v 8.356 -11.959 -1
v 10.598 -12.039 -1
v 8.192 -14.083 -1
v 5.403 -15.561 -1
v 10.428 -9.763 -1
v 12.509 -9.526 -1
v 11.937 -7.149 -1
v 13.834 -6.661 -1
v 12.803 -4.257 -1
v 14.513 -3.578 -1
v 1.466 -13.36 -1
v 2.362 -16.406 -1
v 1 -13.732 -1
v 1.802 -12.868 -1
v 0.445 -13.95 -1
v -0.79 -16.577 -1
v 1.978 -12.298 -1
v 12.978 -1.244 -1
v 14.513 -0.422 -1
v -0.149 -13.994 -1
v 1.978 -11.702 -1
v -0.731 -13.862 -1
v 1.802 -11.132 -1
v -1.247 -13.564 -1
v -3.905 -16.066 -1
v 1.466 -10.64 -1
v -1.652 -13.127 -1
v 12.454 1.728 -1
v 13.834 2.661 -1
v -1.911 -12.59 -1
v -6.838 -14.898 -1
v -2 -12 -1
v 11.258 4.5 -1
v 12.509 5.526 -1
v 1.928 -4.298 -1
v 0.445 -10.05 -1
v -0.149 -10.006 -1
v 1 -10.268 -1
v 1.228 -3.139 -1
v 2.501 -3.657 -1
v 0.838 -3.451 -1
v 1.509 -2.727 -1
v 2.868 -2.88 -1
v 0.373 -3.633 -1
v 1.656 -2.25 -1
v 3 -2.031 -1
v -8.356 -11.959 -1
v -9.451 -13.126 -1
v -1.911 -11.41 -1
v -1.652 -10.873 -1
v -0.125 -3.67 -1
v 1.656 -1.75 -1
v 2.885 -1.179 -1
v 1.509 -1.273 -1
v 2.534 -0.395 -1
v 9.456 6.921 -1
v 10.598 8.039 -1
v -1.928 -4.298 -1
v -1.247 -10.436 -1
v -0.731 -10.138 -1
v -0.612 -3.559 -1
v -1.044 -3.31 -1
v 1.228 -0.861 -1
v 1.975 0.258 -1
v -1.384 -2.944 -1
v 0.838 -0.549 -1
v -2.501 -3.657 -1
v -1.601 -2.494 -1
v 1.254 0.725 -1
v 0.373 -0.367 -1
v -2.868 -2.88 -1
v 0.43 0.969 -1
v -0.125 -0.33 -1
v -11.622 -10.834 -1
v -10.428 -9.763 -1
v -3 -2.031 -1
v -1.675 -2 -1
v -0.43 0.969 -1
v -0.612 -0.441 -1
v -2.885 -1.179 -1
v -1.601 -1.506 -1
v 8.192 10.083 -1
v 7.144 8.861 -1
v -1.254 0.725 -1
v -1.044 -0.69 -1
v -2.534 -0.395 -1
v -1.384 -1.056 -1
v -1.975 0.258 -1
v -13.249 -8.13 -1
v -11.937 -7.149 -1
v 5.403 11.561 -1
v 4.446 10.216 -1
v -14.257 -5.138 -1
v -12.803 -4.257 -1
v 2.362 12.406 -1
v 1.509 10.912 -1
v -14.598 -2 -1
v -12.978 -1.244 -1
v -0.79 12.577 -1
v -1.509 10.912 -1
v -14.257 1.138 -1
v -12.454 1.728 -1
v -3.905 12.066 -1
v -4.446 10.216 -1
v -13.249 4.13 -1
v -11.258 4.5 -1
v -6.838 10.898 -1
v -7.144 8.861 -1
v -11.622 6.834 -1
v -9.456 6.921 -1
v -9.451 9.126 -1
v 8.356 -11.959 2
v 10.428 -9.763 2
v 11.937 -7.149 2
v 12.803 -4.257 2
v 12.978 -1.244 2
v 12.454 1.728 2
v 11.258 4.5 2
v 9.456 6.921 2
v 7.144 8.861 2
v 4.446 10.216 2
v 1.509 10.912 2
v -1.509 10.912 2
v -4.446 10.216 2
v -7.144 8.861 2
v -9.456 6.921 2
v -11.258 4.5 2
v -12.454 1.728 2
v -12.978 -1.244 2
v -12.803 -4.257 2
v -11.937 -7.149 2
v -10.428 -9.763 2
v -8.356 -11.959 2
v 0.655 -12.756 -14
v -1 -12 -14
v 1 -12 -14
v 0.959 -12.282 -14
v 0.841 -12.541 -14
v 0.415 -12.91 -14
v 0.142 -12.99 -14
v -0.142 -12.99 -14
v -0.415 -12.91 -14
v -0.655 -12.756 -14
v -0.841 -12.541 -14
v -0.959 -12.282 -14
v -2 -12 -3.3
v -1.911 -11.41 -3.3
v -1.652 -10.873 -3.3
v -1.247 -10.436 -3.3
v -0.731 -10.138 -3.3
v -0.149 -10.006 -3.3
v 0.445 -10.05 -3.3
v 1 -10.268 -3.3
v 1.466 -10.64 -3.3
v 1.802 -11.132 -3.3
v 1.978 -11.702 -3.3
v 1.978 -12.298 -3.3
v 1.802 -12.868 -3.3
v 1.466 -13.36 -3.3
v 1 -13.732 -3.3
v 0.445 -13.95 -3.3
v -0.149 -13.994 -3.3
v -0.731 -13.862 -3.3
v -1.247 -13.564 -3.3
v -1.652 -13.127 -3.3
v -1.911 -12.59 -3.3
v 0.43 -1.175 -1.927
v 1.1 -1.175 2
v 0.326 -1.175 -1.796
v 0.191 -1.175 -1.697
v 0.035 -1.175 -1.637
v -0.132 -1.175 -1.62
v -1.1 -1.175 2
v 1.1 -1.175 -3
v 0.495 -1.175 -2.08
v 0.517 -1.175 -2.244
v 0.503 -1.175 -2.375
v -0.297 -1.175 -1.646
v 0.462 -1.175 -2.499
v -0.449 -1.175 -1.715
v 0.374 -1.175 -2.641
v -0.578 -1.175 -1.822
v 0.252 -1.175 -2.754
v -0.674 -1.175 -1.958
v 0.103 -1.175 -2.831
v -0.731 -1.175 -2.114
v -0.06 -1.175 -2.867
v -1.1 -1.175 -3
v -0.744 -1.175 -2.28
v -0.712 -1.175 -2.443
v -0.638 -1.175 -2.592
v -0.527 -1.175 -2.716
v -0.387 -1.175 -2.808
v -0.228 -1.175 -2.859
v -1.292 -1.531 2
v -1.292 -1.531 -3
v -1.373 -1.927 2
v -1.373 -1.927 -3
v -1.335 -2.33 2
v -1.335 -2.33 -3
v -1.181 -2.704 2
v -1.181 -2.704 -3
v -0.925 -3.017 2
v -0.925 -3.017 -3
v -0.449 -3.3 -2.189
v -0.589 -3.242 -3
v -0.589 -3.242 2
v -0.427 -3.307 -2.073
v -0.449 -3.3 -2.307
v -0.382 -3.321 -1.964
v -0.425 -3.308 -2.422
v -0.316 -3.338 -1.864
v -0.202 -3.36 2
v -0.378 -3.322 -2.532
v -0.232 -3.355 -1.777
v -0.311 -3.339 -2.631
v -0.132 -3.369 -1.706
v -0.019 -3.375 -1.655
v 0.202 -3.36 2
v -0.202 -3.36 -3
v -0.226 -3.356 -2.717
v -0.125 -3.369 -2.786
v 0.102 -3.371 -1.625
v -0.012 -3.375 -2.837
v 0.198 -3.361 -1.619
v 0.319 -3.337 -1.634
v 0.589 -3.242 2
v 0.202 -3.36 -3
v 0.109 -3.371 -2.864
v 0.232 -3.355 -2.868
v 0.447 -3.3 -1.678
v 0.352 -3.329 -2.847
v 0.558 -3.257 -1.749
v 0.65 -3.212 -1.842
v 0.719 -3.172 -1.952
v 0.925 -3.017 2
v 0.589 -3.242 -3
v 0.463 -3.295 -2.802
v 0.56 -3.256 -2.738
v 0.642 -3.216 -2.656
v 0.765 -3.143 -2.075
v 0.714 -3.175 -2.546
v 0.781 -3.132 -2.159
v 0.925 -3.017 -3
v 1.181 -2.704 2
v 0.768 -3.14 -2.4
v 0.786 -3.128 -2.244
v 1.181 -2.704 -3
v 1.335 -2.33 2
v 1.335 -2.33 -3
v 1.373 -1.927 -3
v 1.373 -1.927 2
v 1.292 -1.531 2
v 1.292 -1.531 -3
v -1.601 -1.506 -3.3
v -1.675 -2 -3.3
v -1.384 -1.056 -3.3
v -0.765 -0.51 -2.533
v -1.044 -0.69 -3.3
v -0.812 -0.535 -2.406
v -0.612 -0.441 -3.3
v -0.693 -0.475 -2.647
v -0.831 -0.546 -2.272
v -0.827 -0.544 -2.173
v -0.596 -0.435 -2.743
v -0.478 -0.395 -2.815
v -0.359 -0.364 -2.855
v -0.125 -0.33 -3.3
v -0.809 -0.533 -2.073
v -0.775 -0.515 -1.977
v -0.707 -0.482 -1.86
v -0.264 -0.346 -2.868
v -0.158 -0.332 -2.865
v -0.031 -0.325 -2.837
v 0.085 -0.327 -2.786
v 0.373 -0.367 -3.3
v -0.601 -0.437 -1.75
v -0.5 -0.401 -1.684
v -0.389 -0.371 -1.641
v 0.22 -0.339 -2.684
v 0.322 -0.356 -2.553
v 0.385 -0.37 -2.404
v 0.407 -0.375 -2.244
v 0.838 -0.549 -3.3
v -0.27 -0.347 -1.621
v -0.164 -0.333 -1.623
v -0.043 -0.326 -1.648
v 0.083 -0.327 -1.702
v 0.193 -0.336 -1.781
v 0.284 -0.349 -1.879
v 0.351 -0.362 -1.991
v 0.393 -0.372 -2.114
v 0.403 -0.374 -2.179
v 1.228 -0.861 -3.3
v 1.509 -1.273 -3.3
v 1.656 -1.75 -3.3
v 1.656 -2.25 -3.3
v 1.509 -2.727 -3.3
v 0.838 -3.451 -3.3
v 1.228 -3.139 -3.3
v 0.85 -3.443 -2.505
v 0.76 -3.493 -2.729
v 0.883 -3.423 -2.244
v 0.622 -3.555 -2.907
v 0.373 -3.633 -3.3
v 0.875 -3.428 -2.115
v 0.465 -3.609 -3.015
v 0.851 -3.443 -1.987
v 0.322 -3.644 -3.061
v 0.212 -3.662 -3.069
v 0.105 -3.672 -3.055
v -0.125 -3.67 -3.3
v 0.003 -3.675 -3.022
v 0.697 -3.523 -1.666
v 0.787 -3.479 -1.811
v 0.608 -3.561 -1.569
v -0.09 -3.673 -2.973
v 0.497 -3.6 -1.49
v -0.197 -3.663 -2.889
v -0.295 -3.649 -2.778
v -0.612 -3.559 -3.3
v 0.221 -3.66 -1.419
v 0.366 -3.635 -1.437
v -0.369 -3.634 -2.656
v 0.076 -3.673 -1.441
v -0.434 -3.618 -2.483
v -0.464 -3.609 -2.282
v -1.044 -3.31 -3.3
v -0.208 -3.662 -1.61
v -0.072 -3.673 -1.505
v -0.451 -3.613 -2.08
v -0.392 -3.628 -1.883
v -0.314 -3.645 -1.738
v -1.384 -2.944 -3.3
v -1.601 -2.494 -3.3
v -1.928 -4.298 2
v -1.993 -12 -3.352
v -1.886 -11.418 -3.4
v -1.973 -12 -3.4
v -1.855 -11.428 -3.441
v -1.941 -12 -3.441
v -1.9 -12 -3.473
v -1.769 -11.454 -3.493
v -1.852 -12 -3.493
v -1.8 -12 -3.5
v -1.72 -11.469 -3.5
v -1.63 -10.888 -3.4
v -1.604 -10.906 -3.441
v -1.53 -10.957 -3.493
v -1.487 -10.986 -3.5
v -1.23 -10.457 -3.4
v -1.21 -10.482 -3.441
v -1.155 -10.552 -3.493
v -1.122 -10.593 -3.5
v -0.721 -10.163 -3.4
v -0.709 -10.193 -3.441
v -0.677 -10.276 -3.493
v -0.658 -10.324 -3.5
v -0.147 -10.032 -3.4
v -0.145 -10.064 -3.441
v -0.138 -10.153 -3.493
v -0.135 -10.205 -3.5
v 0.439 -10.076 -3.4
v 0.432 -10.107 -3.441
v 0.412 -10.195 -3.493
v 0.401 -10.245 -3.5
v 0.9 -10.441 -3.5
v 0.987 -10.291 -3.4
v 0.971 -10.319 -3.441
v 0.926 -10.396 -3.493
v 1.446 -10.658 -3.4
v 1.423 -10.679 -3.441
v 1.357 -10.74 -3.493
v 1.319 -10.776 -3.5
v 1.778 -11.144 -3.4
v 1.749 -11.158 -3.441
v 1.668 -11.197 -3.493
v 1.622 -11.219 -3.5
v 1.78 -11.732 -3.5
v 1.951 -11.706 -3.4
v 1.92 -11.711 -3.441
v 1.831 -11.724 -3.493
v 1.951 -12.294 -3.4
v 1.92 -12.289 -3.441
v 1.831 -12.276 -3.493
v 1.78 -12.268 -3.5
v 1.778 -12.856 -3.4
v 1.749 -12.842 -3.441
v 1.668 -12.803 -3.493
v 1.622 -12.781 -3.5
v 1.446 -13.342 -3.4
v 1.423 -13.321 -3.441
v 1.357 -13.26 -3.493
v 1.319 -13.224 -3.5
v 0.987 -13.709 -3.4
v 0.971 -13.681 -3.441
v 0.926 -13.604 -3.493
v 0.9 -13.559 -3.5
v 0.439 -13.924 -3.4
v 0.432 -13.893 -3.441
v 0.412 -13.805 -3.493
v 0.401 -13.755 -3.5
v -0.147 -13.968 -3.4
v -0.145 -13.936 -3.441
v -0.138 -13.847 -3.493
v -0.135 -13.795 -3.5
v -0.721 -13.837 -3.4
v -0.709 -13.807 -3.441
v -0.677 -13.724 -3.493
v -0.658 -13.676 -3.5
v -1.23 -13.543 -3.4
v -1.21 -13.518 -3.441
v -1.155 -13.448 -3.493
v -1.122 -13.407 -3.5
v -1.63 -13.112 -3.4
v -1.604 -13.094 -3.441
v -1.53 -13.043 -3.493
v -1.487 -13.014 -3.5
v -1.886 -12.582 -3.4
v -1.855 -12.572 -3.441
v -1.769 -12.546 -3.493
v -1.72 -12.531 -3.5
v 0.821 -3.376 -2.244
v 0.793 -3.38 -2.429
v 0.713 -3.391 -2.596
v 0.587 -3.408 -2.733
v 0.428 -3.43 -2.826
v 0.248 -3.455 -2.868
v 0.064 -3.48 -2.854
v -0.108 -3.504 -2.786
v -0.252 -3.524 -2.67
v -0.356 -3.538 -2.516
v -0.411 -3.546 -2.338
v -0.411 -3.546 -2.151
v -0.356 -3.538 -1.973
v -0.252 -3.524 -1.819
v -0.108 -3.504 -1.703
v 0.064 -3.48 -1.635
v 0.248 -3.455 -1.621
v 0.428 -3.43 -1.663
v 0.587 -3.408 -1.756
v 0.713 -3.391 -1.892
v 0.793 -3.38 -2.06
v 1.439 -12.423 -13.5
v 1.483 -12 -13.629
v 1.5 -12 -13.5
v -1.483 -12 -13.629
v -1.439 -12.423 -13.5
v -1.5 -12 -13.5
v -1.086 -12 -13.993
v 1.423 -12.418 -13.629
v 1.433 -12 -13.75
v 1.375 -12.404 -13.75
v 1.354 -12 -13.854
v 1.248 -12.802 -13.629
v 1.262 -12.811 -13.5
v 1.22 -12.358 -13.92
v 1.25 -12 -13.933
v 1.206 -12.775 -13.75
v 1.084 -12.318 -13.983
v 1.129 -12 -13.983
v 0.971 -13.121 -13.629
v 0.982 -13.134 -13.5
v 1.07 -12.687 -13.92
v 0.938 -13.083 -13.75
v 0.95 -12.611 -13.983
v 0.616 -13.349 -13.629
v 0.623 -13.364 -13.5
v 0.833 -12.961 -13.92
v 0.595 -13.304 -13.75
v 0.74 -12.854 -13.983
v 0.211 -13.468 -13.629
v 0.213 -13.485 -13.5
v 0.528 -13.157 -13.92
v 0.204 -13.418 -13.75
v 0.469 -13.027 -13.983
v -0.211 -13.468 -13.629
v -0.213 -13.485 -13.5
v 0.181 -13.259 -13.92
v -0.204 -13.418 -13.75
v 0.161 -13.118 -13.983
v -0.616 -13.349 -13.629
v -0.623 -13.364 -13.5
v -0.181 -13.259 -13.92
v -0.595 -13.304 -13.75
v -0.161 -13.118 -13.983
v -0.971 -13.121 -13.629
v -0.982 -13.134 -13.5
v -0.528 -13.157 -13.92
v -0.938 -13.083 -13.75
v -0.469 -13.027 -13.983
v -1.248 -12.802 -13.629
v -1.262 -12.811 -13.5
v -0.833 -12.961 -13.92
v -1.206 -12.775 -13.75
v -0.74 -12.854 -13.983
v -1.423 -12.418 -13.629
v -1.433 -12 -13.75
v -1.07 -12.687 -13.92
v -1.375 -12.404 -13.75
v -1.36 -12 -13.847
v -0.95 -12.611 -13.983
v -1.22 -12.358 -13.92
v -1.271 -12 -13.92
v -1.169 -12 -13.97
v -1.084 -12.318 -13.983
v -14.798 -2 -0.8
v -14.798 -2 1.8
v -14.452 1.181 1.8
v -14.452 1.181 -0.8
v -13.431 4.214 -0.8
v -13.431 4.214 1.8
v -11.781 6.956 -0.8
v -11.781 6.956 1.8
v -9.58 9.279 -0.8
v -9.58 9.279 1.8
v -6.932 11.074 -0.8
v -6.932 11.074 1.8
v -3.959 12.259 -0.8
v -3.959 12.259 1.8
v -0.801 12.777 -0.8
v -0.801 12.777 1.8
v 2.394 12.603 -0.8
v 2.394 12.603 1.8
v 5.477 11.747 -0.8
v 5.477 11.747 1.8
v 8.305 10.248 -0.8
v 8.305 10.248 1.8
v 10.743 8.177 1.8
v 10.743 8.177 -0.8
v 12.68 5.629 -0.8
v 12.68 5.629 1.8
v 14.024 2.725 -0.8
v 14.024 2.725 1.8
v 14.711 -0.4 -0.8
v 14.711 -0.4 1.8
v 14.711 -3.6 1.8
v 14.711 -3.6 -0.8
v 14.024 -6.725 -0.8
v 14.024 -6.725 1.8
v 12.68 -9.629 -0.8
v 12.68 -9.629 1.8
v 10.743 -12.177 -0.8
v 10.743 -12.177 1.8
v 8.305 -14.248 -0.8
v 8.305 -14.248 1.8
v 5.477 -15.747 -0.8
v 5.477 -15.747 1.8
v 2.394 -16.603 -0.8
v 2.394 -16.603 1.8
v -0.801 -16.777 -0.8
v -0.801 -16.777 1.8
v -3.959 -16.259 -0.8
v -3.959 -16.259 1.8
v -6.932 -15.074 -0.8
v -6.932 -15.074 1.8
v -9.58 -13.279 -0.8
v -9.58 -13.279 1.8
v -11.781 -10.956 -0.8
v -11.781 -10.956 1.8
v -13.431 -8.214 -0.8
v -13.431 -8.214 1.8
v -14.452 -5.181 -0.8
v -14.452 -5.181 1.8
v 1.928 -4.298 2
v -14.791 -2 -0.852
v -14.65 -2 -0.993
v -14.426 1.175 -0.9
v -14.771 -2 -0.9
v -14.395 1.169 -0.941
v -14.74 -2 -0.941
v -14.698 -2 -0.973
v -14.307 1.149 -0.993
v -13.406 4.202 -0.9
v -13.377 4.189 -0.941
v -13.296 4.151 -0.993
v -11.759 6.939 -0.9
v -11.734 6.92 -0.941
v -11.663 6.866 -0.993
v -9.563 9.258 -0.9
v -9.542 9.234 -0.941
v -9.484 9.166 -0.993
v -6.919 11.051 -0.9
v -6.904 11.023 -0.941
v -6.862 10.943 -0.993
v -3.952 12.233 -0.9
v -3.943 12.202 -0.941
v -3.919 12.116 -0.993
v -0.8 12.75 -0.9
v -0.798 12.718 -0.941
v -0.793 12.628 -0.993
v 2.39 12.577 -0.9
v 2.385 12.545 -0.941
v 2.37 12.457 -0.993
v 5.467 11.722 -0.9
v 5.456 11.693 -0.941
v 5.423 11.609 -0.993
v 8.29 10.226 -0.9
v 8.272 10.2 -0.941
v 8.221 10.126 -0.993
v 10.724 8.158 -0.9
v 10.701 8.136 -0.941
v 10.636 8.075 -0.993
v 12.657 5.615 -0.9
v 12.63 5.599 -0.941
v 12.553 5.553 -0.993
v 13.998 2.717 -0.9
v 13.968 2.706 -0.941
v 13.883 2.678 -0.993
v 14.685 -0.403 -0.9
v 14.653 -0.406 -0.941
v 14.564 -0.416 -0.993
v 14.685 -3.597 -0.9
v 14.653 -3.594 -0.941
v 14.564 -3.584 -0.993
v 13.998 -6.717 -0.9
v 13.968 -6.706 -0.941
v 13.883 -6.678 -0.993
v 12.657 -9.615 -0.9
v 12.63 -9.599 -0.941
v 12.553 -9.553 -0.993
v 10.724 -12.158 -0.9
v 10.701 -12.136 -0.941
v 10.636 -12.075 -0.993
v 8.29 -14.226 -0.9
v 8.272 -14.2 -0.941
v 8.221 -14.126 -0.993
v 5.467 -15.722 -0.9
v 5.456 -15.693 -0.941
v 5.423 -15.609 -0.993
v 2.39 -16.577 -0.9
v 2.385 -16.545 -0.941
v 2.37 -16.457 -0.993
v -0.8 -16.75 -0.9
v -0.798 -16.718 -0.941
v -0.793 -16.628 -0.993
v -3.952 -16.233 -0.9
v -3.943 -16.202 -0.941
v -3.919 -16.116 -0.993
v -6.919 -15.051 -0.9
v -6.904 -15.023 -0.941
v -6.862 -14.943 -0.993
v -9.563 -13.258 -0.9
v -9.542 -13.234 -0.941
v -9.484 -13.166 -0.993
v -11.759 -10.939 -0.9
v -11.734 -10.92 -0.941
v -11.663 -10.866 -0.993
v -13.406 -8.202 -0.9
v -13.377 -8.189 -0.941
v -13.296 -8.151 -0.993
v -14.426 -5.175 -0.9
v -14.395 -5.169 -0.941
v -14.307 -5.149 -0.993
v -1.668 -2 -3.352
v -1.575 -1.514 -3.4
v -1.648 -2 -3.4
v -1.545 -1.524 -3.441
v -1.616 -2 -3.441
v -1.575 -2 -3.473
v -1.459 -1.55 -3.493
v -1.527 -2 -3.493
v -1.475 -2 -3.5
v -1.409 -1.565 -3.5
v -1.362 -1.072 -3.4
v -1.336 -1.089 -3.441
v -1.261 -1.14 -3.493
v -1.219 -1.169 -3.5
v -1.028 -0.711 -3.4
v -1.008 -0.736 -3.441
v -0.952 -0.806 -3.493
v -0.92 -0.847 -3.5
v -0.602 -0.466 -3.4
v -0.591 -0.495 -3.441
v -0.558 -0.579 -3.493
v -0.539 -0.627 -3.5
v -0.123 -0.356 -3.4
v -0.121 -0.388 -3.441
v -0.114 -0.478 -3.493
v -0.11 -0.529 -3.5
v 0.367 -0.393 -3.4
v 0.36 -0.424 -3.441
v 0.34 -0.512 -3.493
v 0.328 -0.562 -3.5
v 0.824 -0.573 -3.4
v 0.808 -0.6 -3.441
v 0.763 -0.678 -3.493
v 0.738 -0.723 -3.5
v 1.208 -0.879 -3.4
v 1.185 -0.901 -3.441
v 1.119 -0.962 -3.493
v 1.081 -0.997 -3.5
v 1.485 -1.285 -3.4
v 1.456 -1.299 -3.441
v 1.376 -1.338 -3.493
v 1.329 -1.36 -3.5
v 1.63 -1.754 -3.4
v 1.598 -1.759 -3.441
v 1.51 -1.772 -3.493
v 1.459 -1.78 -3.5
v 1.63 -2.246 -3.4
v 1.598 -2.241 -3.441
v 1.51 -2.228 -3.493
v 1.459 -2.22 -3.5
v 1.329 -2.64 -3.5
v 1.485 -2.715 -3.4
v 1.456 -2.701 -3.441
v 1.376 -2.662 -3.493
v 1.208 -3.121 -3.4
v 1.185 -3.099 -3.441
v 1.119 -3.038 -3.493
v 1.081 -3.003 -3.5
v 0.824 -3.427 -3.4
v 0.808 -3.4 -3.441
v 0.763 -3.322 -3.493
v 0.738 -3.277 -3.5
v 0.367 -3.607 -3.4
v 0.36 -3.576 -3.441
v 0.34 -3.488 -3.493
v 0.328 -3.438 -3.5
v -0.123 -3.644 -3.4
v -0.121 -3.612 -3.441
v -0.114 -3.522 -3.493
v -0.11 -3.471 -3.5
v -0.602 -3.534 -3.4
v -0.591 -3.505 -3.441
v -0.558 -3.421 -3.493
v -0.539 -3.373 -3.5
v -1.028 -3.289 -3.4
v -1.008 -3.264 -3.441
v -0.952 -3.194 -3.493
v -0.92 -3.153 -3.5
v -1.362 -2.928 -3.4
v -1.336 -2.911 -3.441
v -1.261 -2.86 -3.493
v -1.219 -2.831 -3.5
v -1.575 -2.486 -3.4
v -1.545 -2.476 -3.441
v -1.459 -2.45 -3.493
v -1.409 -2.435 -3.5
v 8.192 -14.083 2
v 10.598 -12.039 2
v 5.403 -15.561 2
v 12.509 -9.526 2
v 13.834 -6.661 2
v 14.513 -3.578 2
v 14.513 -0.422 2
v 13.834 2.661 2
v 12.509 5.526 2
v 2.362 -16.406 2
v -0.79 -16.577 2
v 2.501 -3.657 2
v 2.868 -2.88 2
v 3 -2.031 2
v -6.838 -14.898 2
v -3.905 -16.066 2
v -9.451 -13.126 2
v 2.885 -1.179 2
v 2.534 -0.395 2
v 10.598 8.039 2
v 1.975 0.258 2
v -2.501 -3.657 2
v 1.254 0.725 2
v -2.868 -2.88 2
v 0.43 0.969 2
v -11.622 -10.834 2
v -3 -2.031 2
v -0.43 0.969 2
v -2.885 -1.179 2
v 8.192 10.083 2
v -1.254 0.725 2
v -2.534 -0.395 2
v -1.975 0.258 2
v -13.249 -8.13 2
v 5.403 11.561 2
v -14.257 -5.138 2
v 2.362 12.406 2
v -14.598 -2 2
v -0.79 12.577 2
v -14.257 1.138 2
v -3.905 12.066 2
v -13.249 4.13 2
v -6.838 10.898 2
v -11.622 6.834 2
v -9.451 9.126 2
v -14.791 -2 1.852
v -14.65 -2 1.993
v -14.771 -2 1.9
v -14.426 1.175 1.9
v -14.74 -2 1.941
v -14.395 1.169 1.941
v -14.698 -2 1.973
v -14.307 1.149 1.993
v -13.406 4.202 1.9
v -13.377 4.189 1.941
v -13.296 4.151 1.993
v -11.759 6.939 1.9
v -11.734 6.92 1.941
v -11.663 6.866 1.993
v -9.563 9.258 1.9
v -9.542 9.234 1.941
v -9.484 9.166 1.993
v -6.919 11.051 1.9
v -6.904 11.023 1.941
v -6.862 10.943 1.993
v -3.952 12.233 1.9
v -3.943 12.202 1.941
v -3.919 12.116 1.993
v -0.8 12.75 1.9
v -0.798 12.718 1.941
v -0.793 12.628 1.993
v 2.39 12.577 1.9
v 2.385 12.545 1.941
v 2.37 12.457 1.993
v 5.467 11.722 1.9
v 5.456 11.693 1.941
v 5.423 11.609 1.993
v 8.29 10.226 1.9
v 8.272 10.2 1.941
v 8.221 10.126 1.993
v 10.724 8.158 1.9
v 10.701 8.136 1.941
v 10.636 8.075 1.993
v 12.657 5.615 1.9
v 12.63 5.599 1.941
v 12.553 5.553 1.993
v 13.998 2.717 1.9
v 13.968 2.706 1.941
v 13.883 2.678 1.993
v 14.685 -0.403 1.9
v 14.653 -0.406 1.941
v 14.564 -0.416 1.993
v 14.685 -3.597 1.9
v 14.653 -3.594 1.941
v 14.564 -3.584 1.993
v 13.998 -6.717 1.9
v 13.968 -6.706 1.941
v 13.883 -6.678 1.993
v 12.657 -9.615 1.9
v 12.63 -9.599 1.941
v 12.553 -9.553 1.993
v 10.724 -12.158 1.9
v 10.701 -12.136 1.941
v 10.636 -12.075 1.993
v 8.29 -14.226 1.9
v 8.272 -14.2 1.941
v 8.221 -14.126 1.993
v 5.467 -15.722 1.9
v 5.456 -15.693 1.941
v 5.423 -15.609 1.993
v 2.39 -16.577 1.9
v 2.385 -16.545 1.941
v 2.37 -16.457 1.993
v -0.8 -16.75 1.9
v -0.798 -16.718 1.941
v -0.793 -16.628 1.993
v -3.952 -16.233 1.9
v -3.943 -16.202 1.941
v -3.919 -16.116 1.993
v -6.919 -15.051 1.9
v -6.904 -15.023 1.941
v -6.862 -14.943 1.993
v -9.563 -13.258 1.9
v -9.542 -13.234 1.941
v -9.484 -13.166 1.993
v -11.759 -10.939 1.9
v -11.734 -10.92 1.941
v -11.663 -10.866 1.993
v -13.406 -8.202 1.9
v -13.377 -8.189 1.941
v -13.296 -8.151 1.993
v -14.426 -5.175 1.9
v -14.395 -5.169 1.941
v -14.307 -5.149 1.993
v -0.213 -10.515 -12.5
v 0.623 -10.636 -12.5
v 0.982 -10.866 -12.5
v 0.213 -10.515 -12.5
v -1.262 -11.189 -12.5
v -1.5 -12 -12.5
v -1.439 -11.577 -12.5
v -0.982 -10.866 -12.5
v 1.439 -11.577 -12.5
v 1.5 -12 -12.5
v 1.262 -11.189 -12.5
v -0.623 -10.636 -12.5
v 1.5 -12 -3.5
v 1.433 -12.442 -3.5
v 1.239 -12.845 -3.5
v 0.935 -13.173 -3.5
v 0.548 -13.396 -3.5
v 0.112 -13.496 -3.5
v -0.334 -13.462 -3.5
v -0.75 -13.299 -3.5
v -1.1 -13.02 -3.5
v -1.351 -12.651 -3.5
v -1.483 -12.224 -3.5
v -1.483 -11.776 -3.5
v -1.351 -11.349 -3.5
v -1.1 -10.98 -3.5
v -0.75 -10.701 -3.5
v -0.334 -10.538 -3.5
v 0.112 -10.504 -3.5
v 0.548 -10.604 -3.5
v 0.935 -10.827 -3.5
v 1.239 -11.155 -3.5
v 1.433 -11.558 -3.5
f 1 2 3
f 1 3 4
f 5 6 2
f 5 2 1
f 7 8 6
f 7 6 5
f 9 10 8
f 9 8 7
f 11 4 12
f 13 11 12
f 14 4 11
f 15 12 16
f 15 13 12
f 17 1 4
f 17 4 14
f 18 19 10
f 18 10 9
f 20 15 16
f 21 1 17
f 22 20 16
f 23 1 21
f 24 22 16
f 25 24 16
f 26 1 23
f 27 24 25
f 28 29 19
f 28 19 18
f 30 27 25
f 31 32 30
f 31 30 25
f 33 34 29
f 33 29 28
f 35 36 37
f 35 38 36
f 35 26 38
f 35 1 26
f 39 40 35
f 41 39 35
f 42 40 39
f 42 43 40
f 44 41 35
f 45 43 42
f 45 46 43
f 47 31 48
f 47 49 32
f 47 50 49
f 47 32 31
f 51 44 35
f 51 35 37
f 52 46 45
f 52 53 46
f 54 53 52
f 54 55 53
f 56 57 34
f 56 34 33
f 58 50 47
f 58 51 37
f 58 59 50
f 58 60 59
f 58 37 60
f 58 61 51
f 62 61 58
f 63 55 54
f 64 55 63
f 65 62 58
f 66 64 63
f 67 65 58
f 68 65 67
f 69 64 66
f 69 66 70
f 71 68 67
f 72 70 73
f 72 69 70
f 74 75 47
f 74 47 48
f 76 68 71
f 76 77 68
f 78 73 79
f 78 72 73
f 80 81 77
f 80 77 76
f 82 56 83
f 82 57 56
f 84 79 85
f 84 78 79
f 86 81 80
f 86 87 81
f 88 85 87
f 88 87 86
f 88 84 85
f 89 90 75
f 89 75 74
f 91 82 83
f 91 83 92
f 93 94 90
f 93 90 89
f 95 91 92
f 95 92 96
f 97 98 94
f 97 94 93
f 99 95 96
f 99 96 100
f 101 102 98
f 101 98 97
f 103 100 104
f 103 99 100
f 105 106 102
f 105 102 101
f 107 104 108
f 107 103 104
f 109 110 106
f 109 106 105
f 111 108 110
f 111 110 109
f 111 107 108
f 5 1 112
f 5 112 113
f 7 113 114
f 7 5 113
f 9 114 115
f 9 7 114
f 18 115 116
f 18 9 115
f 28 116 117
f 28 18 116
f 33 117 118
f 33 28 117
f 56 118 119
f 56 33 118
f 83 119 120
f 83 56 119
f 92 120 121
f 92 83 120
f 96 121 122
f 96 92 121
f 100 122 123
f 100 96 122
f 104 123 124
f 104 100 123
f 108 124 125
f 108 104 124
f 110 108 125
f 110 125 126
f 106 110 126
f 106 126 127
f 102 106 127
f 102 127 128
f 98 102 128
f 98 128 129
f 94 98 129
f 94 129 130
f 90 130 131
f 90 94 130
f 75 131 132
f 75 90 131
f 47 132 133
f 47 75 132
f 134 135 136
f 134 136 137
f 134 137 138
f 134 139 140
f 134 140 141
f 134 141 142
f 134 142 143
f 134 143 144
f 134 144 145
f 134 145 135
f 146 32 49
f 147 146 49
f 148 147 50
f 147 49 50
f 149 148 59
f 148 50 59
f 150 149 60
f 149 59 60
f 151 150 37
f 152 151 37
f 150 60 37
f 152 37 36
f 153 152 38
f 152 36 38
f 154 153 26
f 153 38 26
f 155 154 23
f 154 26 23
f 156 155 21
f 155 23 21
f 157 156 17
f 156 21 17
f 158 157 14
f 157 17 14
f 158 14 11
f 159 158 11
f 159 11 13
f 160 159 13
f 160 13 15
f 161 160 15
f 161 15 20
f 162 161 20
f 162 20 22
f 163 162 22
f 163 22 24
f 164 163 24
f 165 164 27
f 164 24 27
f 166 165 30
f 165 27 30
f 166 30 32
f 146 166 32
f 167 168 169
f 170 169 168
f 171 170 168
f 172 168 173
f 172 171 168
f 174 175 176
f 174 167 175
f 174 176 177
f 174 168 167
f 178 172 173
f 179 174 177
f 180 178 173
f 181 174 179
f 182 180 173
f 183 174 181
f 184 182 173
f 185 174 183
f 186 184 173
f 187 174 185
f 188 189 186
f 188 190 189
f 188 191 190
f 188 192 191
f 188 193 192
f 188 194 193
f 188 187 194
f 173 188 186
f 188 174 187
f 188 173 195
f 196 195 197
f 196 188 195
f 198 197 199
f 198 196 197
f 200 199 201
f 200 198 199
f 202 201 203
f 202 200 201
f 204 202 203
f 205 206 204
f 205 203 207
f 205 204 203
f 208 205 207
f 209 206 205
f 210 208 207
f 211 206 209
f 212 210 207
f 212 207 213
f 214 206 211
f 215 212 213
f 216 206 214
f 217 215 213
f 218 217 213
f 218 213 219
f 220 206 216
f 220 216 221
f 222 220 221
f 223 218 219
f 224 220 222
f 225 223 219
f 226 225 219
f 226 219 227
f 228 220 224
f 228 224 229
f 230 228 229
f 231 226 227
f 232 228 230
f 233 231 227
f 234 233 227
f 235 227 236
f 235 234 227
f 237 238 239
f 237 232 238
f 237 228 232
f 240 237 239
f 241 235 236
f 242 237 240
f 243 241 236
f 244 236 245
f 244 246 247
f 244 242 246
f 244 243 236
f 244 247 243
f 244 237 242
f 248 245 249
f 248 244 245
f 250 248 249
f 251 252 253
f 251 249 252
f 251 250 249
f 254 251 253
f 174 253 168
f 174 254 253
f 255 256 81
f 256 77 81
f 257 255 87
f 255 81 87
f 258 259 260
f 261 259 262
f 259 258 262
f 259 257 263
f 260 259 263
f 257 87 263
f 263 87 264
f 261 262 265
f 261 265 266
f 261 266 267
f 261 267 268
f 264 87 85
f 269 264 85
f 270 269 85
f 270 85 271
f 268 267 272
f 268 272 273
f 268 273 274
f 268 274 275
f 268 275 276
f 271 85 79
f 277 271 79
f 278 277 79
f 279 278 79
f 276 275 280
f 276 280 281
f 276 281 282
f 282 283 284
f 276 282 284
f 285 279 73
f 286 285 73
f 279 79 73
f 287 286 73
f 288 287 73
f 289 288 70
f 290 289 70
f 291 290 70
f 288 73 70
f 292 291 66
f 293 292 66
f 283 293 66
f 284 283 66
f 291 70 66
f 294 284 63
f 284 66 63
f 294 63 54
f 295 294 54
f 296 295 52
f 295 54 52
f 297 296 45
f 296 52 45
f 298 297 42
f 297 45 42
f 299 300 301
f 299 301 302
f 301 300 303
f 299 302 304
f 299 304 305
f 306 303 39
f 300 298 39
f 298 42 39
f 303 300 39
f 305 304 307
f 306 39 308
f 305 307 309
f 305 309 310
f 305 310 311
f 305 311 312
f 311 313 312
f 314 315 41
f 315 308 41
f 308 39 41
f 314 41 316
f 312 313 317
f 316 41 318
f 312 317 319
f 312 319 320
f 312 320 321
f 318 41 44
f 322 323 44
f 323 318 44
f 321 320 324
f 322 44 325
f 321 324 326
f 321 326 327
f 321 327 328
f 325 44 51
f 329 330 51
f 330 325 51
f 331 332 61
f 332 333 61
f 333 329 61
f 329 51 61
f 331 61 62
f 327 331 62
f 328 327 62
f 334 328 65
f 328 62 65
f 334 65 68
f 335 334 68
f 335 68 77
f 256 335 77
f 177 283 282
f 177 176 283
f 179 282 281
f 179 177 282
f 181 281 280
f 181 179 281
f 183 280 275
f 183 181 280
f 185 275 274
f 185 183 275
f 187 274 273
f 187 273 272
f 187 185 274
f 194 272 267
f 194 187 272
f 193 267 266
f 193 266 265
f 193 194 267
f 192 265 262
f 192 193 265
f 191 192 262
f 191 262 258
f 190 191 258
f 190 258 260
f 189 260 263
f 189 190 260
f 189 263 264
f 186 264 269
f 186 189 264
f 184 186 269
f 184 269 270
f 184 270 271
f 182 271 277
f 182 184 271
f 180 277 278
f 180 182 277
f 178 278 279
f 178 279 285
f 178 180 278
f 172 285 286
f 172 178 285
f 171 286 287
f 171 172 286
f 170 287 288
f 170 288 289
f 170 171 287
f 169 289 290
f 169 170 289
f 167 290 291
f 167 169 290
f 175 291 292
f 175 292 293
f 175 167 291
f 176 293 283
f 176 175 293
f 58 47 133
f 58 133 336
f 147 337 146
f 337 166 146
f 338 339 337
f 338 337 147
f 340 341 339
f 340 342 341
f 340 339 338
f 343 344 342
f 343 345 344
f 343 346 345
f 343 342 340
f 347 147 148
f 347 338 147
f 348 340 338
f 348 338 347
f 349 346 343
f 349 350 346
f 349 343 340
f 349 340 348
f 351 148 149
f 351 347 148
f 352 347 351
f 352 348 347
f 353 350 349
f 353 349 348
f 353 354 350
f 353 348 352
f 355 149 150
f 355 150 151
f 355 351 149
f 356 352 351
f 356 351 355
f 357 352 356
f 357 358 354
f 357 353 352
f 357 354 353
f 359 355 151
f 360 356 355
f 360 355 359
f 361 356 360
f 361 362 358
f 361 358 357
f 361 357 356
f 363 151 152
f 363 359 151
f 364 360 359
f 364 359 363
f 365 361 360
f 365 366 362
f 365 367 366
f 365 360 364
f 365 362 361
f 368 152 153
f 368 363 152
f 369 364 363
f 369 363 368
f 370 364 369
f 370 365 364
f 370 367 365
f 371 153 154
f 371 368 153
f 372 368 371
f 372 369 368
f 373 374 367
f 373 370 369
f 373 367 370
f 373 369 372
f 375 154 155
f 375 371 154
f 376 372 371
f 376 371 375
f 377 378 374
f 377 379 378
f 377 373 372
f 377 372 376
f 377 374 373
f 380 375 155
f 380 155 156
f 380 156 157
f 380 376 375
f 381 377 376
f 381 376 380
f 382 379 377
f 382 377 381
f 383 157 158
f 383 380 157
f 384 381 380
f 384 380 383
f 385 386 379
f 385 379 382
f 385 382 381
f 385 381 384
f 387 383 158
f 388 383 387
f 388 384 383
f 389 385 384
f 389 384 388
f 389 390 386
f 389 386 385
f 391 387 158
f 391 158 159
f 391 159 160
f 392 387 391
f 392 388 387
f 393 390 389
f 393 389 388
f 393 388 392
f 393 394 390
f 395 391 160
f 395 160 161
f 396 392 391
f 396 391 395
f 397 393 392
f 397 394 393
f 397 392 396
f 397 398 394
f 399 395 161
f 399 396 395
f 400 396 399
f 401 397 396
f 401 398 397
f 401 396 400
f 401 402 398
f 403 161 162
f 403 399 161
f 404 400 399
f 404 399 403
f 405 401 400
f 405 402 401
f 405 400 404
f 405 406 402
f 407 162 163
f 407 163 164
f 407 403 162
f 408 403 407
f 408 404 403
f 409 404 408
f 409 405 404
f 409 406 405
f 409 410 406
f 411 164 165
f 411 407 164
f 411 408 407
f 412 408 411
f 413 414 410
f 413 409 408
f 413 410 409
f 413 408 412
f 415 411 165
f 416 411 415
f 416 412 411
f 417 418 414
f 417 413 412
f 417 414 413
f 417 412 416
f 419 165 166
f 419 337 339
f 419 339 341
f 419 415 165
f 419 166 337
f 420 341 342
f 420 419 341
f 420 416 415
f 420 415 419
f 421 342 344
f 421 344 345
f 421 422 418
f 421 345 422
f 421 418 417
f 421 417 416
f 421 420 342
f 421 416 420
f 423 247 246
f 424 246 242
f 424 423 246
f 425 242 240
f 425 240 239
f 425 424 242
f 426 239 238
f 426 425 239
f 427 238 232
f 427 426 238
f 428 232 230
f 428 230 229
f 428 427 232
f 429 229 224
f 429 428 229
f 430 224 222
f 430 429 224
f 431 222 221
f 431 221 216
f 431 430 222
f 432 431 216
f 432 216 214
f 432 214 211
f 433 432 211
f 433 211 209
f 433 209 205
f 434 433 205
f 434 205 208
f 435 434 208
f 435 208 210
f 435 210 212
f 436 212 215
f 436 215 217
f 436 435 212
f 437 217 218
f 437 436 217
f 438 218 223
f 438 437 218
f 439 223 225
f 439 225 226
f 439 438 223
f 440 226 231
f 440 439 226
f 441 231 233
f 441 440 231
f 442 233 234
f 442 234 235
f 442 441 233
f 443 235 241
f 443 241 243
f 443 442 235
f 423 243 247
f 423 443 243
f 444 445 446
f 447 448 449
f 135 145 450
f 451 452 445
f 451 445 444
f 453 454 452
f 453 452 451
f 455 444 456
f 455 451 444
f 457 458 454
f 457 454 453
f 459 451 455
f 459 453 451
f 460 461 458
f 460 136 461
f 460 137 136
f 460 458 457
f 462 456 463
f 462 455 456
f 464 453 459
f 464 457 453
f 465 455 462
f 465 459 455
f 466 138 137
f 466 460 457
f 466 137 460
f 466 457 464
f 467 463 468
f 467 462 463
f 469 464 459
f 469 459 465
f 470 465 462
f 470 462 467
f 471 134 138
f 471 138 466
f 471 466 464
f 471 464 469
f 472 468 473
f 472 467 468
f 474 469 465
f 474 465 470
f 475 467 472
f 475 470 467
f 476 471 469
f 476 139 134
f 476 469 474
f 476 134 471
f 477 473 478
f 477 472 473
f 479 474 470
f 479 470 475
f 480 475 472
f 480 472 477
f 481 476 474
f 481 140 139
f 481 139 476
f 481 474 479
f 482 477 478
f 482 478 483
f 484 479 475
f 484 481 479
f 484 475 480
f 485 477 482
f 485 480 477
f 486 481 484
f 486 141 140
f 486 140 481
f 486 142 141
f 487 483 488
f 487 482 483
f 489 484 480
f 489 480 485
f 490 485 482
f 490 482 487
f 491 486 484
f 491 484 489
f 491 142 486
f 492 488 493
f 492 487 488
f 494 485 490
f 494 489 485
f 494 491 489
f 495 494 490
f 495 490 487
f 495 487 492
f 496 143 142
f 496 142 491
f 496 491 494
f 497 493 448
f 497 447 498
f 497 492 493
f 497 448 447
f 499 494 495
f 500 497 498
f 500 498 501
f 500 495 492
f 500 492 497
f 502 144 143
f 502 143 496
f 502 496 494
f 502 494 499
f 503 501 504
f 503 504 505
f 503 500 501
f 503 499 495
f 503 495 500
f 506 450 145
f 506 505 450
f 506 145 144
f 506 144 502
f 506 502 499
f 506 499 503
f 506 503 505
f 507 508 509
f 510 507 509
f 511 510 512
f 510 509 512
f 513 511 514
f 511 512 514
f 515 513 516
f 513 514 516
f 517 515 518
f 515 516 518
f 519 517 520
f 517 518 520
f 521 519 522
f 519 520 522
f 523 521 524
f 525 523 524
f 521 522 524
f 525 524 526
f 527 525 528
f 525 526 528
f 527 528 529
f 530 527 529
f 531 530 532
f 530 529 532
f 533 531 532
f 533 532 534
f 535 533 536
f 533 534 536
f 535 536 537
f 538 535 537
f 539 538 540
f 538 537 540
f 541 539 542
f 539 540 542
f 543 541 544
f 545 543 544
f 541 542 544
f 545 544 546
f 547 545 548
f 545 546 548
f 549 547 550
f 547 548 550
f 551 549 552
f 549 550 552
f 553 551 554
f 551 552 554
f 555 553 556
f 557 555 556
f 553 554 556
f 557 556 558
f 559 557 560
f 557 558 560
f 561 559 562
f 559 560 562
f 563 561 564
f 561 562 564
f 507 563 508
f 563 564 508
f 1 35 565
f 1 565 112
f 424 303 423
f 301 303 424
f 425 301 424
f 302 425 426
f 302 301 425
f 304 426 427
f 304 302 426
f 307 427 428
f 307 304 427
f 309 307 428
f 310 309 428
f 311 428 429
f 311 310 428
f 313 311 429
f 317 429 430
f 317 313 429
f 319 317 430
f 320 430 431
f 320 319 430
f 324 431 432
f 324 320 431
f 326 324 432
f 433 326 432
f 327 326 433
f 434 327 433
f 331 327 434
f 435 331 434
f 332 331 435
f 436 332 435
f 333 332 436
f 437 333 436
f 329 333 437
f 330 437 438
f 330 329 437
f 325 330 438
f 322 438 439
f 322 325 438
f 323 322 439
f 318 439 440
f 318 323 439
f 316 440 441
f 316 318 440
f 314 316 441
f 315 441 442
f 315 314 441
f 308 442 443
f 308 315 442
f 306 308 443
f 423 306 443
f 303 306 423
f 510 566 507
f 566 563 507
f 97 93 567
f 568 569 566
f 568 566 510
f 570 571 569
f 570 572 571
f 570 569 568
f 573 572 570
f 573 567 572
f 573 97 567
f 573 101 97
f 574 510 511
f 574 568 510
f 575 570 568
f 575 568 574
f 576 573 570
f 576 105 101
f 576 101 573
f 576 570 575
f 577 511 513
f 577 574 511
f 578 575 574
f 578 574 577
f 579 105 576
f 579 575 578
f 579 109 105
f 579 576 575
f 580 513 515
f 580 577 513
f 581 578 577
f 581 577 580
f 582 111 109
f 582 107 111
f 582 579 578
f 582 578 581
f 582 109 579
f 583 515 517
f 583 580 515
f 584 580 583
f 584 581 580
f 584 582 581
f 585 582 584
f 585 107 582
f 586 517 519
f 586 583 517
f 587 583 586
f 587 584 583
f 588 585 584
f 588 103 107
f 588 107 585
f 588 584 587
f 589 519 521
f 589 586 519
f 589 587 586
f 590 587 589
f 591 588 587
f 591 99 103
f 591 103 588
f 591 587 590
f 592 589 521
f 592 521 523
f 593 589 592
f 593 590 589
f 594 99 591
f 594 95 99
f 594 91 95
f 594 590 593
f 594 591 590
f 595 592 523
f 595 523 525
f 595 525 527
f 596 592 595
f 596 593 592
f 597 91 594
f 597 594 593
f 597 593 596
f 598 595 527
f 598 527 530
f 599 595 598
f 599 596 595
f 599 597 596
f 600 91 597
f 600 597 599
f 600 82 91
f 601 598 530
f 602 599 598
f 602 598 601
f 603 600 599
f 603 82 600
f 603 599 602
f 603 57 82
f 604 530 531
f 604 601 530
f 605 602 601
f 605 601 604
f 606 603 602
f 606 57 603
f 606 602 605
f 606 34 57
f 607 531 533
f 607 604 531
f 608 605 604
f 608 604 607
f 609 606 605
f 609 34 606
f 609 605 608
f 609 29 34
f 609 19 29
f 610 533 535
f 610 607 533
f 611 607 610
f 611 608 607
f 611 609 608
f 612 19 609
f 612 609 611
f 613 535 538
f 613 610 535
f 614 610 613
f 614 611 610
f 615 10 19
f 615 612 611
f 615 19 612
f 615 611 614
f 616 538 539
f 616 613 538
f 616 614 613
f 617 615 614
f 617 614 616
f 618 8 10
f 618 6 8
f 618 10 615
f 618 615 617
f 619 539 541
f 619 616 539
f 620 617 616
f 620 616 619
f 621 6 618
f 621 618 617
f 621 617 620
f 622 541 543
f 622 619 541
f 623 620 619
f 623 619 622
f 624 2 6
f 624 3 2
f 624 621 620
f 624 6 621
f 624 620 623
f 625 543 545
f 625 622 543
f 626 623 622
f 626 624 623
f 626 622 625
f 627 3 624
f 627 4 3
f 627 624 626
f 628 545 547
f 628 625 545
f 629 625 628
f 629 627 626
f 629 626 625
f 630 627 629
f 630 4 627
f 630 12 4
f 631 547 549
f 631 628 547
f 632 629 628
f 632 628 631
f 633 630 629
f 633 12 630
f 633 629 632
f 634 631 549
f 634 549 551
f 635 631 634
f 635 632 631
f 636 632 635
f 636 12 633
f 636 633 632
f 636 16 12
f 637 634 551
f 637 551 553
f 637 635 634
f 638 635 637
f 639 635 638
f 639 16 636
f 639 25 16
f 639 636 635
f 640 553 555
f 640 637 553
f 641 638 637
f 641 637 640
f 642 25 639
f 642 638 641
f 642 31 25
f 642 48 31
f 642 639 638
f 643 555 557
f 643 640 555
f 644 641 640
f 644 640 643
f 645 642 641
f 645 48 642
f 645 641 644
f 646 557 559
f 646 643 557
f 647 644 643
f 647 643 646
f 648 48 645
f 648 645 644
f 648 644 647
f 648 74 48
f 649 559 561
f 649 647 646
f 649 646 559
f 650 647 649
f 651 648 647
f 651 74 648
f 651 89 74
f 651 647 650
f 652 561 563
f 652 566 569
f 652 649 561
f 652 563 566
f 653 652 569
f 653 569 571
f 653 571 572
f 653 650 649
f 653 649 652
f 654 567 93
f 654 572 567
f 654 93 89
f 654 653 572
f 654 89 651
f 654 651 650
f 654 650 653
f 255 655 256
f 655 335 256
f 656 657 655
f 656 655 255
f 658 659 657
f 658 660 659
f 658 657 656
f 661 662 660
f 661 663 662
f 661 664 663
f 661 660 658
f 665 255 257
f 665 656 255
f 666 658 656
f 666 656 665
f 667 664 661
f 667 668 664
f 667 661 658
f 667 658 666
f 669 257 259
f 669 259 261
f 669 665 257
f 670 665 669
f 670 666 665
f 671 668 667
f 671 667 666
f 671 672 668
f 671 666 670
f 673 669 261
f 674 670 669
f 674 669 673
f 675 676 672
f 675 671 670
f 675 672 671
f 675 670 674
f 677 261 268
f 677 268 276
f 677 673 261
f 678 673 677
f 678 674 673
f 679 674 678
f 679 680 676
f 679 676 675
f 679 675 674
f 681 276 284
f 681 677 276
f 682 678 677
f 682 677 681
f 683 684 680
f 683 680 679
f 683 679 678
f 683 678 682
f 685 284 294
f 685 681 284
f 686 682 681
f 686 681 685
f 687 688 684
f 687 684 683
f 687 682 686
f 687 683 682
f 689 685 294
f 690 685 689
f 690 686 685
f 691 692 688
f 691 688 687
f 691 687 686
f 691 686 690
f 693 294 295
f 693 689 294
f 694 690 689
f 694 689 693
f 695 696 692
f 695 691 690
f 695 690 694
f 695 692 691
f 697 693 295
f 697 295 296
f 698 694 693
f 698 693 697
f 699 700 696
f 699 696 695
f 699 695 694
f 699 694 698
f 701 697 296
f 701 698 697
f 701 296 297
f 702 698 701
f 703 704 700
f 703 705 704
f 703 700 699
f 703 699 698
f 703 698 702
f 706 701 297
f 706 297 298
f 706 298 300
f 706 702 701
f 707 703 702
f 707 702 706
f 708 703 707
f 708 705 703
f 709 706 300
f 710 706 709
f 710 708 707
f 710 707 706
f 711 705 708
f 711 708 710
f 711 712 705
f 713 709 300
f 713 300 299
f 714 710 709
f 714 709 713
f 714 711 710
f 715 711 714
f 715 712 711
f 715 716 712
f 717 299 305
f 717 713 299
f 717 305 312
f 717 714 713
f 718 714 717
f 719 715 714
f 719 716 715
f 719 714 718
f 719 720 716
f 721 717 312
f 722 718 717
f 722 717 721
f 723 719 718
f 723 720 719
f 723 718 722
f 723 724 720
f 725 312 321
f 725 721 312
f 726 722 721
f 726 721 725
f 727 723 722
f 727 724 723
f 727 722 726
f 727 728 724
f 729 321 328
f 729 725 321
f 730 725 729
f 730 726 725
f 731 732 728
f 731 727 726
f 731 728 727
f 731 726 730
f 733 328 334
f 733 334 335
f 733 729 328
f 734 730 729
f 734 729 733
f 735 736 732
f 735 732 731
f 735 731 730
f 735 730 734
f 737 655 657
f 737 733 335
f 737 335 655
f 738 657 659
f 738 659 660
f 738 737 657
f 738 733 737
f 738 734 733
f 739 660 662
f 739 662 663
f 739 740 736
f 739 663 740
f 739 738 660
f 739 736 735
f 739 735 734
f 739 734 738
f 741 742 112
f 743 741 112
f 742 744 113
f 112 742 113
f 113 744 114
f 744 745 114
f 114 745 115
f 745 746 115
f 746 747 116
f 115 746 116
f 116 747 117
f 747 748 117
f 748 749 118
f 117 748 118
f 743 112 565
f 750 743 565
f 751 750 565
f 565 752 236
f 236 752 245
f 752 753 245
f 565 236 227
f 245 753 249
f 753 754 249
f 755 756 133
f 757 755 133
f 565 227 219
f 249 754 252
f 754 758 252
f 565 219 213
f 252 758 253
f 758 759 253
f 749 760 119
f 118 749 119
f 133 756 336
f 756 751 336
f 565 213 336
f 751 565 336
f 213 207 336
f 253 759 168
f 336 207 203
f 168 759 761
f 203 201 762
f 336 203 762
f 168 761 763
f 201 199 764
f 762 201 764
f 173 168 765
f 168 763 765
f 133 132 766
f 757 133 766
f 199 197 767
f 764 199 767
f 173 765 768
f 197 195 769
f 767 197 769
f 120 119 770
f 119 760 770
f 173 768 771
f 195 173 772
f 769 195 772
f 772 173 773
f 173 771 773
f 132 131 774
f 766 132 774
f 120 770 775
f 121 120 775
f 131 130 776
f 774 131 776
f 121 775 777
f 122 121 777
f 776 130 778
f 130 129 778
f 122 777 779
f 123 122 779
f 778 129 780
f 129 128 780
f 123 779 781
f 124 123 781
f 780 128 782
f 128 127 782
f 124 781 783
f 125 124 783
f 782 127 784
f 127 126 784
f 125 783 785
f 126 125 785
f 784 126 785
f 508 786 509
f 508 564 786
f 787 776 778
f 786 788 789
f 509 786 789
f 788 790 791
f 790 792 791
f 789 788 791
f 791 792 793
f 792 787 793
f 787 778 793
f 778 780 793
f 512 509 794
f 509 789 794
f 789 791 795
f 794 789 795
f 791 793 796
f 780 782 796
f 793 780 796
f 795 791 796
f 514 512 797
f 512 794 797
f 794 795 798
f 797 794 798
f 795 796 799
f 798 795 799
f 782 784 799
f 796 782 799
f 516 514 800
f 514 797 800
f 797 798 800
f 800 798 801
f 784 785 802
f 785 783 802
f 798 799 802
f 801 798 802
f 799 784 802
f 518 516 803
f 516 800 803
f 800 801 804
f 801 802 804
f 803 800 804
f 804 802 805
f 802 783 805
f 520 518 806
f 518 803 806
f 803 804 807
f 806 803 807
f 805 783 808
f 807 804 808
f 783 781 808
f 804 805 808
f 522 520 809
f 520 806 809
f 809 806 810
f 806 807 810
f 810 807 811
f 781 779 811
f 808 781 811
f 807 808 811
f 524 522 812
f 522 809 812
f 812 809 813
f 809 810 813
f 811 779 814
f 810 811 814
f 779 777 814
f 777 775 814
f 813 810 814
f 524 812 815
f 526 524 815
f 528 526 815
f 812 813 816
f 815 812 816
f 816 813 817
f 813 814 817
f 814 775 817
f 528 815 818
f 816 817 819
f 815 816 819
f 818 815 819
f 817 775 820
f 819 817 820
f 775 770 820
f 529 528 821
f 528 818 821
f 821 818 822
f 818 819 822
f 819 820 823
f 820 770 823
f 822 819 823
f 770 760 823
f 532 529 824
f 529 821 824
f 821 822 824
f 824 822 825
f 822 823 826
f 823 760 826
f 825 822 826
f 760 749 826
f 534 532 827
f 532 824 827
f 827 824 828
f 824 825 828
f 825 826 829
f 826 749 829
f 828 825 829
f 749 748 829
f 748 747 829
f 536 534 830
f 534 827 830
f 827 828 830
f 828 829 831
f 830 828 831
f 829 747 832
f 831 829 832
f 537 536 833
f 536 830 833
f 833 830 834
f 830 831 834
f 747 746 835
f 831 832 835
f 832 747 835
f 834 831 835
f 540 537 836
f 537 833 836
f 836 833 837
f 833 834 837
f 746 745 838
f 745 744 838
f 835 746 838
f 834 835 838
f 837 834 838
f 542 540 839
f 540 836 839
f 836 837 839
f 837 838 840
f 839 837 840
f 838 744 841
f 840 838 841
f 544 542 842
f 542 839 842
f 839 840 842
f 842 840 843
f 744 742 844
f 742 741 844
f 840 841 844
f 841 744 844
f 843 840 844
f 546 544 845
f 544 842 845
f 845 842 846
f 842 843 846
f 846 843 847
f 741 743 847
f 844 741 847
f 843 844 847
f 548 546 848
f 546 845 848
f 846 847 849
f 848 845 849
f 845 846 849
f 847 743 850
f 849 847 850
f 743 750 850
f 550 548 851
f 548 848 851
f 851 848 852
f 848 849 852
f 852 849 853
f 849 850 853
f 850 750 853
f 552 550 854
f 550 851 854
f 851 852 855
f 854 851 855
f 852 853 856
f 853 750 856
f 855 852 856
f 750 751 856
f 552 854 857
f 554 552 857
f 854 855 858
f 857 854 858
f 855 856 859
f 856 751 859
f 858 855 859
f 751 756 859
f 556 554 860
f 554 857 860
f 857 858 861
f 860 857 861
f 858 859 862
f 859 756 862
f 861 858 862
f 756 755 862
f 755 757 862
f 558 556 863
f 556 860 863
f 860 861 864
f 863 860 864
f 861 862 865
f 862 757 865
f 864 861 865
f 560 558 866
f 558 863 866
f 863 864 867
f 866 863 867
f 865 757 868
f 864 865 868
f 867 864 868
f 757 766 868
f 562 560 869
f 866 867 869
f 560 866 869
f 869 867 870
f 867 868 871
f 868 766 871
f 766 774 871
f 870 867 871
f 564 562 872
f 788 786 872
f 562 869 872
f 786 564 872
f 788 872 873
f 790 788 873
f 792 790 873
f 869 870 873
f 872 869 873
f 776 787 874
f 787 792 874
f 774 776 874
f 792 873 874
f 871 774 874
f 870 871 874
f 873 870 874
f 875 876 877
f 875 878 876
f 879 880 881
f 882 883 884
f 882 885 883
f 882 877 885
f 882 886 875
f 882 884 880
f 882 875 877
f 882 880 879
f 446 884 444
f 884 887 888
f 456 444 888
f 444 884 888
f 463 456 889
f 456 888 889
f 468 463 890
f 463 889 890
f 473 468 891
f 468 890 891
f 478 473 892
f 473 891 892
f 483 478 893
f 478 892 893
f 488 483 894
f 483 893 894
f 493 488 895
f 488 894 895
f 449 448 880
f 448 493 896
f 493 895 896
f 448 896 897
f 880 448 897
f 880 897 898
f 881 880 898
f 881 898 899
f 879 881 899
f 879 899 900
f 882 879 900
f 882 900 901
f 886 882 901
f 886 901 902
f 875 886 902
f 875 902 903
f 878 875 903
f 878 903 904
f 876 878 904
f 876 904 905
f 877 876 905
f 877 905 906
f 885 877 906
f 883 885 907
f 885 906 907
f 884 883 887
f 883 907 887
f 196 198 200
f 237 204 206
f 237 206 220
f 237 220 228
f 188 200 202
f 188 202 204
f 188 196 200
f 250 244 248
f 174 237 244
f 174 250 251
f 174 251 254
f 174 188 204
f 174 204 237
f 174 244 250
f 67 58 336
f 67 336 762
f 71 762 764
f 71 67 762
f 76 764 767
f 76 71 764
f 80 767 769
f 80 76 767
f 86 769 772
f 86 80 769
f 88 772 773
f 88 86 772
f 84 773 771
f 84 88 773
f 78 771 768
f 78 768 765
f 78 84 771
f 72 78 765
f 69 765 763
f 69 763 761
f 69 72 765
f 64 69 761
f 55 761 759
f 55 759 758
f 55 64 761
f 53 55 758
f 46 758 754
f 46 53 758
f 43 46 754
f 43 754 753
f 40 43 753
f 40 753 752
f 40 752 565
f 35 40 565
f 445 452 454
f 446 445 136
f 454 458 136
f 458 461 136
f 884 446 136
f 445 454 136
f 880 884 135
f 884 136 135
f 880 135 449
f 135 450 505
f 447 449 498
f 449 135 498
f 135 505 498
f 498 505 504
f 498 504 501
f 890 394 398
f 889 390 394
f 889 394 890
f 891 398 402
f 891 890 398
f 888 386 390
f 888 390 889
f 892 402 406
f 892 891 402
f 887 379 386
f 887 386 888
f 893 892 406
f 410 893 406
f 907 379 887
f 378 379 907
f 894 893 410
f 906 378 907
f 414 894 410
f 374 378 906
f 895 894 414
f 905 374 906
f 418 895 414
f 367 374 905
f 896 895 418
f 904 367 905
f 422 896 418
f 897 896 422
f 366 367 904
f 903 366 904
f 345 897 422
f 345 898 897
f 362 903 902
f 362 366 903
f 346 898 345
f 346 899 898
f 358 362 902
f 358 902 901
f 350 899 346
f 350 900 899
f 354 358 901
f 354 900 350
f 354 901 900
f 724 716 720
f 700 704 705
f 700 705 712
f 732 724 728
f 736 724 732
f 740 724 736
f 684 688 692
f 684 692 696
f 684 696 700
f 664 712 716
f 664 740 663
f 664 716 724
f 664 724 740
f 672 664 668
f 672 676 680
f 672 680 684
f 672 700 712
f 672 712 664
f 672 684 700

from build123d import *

# Parameters (mm, degrees)
ESQUISSE2_R             = 14.79822015
BOSS_EXTRU_1_DEPTH      = 3
CONG_2_R                = 0.2
CONG_3_R                = 0.2
ESQUISSE3_R             = 1.5
BOSS_EXTRU_2_DEPTH      = 13
CONG_4_R                = 0.5
ENL_V_MAT_EXTRU_1_DEPTH = 3.5
ESQUISSE5_R             = 1.675
BOSS_EXTRU_3_DEPTH      = 2.5
ENL_V_START             = -5
ENL_V_MAT_EXTRU_2_DEPTH = 5
CONG_6_R                = 0.2
ESQUISSE8_R             = 2
ESQUISSE8_R_2           = 1.5
BOSS_EXTRU_4_DEPTH      = 2.5
CONG_7_R                = 0.2
ENL_V_MAT_EXTRU_3_REACH = 27.888
ESQUISSE14_W            = 6.151008923
ESQUISSE14_H            = 1.920006843
ENL_V_MAT_EXTRU_4_DEPTH = 1.5


with BuildPart() as part:
    # Esquisse2 → Boss.-Extru.1 (new body)
    with BuildSketch(Plane(origin=(0, 0, 2), x_dir=(-1, 0, 0), z_dir=(0, 0, -1))):
        with Locations((0, -2)):
            Circle(ESQUISSE2_R)
    extrude(amount=BOSS_EXTRU_1_DEPTH)

    # Congé2
    cong_2_edges = [part.edges().sort_by_distance(p)[0] for p in [
        (14.79822015, -2, -1),
    ]]
    fillet(cong_2_edges, radius=CONG_2_R)

    # Congé3
    cong_3_edges = [part.edges().sort_by_distance(p)[0] for p in [
        (14.79822015, -2, 2),
    ]]
    fillet(cong_3_edges, radius=CONG_3_R)

    # Esquisse3 → Boss.-Extru.2 (add)
    with BuildSketch(Plane(origin=(0, 0, -1), x_dir=(-1, 0, 0), z_dir=(0, 0, -1))):
        with Locations(Location((0, -12, 0), (0, 0, 180))):
            Circle(ESQUISSE3_R)
    extrude(amount=BOSS_EXTRU_2_DEPTH)

    # Congé4
    cong_4_edges = [part.edges().sort_by_distance(p)[0] for p in [
        (-1.5, -12, -14),
    ]]
    fillet(cong_4_edges, radius=CONG_4_R)

    # Esquisse4 → Enlèv. mat.-Extru.1 (cut)
    with BuildSketch(Plane(origin=(0, 0, -1), x_dir=(-1, 0, 0), z_dir=(0, 0, -1))):
        with BuildLine():
            Line((-1.1, -1.175), (1.1, -1.175))
            ThreePointArc((1.1, -1.175), (0, -3.375), (-1.1, -1.175))
        make_face()
    extrude(amount=-ENL_V_MAT_EXTRU_1_DEPTH, mode=Mode.SUBTRACT)

    # Esquisse5 → Boss.-Extru.3 (add)
    with BuildSketch(Plane(origin=(0, 0, -1), x_dir=(-1, 0, 0), z_dir=(0, 0, -1))):
        with Locations((0, -2)):
            Circle(ESQUISSE5_R)
    extrude(amount=BOSS_EXTRU_3_DEPTH)

    # Esquisse6 → Enlèv. mat.-Extru.2 (cut)
    with BuildSketch(Plane.XY.offset(2).offset(ENL_V_START)):
        with BuildLine():
            Line((1.1, -1.175), (-1.1, -1.175))
            ThreePointArc((-1.1, -1.175), (0, -3.375), (1.1, -1.175))
        make_face()
    extrude(amount=ENL_V_MAT_EXTRU_2_DEPTH, mode=Mode.SUBTRACT)

    # Congé6
    cong_6_edges = [part.edges().sort_by_distance(p)[0] for p in [
        (1.675, -2, -3.5),
    ]]
    fillet(cong_6_edges, radius=CONG_6_R)

    # Esquisse8 → Boss.-Extru.4 (add)
    with BuildSketch(Plane(origin=(0, 0, -1), x_dir=(-1, 0, 0), z_dir=(0, 0, -1))):
        with Locations((0, -12)):
            Circle(ESQUISSE8_R)
        with Locations(Location((0, -12, 0), (0, 0, 180))):
            Circle(ESQUISSE8_R_2, mode=Mode.SUBTRACT)
    extrude(amount=BOSS_EXTRU_4_DEPTH)

    # Congé7
    cong_7_edges = [part.edges().sort_by_distance(p)[0] for p in [
        (2, -12, -3.5),
    ]]
    fillet(cong_7_edges, radius=CONG_7_R)

    # Esquisse9 → Trou taraudé M1.61 (revolve, cut)
    with BuildSketch(Plane(origin=(0.228696217, -3.659314027, -2.244412235), x_dir=(0.9906352400032369, 0.1365350550727882, 0), z_dir=(0, 0, 1))):
        Polygon((0, 0), (0, 18.355114173), (0.625, 18.355114173), (0.625, 0.2), (0.825, 0), align=None)
    revolve(axis=Axis((1.095693817, -9.949847801, -2.244412235), (-0.13653505507278818, 0.9906352400032369, 0)), mode=Mode.SUBTRACT)

    # Esquisse11 → Enlèv. mat.-Extru.3 (cut, up to next)
    with BuildSketch(Plane(origin=(0, 0, -1), x_dir=(-1, 0, 0), z_dir=(0, 0, -1)), mode=Mode.PRIVATE) as enl_v_mat_extru_3_sk1:
        with BuildLine():
            Line((-1.928362829, -4.298133329), (-8.356238926, -11.958577761))
            ThreePointArc((-8.356238926, -11.958577761), (0, 11), (8.356238926, -11.958577761))
            Line((8.356238926, -11.958577761), (1.928362829, -4.298133329))
            ThreePointArc((1.928362829, -4.298133329), (0, 1), (-1.928362829, -4.298133329))
        make_face()
    enl_v_mat_extru_3_tool1 = extrude(enl_v_mat_extru_3_sk1.sketch, amount=-ENL_V_MAT_EXTRU_3_REACH, mode=Mode.PRIVATE) & part.part
    add(enl_v_mat_extru_3_tool1.solids().sort_by_distance((-5.408009, -7.9054, -1))[0], mode=Mode.SUBTRACT)

    # Esquisse14 → Enlèv. mat.-Extru.4 (cut)
    with BuildSketch(Plane(origin=(0, 0, -14), x_dir=(-1, 0, 0), z_dir=(0, 0, -1))):
        with Locations((-0.122541976, -11.039996579)):
            Rectangle(ESQUISSE14_W, ESQUISSE14_H)
    extrude(amount=-ENL_V_MAT_EXTRU_4_DEPTH, mode=Mode.SUBTRACT)


solid = part.part
